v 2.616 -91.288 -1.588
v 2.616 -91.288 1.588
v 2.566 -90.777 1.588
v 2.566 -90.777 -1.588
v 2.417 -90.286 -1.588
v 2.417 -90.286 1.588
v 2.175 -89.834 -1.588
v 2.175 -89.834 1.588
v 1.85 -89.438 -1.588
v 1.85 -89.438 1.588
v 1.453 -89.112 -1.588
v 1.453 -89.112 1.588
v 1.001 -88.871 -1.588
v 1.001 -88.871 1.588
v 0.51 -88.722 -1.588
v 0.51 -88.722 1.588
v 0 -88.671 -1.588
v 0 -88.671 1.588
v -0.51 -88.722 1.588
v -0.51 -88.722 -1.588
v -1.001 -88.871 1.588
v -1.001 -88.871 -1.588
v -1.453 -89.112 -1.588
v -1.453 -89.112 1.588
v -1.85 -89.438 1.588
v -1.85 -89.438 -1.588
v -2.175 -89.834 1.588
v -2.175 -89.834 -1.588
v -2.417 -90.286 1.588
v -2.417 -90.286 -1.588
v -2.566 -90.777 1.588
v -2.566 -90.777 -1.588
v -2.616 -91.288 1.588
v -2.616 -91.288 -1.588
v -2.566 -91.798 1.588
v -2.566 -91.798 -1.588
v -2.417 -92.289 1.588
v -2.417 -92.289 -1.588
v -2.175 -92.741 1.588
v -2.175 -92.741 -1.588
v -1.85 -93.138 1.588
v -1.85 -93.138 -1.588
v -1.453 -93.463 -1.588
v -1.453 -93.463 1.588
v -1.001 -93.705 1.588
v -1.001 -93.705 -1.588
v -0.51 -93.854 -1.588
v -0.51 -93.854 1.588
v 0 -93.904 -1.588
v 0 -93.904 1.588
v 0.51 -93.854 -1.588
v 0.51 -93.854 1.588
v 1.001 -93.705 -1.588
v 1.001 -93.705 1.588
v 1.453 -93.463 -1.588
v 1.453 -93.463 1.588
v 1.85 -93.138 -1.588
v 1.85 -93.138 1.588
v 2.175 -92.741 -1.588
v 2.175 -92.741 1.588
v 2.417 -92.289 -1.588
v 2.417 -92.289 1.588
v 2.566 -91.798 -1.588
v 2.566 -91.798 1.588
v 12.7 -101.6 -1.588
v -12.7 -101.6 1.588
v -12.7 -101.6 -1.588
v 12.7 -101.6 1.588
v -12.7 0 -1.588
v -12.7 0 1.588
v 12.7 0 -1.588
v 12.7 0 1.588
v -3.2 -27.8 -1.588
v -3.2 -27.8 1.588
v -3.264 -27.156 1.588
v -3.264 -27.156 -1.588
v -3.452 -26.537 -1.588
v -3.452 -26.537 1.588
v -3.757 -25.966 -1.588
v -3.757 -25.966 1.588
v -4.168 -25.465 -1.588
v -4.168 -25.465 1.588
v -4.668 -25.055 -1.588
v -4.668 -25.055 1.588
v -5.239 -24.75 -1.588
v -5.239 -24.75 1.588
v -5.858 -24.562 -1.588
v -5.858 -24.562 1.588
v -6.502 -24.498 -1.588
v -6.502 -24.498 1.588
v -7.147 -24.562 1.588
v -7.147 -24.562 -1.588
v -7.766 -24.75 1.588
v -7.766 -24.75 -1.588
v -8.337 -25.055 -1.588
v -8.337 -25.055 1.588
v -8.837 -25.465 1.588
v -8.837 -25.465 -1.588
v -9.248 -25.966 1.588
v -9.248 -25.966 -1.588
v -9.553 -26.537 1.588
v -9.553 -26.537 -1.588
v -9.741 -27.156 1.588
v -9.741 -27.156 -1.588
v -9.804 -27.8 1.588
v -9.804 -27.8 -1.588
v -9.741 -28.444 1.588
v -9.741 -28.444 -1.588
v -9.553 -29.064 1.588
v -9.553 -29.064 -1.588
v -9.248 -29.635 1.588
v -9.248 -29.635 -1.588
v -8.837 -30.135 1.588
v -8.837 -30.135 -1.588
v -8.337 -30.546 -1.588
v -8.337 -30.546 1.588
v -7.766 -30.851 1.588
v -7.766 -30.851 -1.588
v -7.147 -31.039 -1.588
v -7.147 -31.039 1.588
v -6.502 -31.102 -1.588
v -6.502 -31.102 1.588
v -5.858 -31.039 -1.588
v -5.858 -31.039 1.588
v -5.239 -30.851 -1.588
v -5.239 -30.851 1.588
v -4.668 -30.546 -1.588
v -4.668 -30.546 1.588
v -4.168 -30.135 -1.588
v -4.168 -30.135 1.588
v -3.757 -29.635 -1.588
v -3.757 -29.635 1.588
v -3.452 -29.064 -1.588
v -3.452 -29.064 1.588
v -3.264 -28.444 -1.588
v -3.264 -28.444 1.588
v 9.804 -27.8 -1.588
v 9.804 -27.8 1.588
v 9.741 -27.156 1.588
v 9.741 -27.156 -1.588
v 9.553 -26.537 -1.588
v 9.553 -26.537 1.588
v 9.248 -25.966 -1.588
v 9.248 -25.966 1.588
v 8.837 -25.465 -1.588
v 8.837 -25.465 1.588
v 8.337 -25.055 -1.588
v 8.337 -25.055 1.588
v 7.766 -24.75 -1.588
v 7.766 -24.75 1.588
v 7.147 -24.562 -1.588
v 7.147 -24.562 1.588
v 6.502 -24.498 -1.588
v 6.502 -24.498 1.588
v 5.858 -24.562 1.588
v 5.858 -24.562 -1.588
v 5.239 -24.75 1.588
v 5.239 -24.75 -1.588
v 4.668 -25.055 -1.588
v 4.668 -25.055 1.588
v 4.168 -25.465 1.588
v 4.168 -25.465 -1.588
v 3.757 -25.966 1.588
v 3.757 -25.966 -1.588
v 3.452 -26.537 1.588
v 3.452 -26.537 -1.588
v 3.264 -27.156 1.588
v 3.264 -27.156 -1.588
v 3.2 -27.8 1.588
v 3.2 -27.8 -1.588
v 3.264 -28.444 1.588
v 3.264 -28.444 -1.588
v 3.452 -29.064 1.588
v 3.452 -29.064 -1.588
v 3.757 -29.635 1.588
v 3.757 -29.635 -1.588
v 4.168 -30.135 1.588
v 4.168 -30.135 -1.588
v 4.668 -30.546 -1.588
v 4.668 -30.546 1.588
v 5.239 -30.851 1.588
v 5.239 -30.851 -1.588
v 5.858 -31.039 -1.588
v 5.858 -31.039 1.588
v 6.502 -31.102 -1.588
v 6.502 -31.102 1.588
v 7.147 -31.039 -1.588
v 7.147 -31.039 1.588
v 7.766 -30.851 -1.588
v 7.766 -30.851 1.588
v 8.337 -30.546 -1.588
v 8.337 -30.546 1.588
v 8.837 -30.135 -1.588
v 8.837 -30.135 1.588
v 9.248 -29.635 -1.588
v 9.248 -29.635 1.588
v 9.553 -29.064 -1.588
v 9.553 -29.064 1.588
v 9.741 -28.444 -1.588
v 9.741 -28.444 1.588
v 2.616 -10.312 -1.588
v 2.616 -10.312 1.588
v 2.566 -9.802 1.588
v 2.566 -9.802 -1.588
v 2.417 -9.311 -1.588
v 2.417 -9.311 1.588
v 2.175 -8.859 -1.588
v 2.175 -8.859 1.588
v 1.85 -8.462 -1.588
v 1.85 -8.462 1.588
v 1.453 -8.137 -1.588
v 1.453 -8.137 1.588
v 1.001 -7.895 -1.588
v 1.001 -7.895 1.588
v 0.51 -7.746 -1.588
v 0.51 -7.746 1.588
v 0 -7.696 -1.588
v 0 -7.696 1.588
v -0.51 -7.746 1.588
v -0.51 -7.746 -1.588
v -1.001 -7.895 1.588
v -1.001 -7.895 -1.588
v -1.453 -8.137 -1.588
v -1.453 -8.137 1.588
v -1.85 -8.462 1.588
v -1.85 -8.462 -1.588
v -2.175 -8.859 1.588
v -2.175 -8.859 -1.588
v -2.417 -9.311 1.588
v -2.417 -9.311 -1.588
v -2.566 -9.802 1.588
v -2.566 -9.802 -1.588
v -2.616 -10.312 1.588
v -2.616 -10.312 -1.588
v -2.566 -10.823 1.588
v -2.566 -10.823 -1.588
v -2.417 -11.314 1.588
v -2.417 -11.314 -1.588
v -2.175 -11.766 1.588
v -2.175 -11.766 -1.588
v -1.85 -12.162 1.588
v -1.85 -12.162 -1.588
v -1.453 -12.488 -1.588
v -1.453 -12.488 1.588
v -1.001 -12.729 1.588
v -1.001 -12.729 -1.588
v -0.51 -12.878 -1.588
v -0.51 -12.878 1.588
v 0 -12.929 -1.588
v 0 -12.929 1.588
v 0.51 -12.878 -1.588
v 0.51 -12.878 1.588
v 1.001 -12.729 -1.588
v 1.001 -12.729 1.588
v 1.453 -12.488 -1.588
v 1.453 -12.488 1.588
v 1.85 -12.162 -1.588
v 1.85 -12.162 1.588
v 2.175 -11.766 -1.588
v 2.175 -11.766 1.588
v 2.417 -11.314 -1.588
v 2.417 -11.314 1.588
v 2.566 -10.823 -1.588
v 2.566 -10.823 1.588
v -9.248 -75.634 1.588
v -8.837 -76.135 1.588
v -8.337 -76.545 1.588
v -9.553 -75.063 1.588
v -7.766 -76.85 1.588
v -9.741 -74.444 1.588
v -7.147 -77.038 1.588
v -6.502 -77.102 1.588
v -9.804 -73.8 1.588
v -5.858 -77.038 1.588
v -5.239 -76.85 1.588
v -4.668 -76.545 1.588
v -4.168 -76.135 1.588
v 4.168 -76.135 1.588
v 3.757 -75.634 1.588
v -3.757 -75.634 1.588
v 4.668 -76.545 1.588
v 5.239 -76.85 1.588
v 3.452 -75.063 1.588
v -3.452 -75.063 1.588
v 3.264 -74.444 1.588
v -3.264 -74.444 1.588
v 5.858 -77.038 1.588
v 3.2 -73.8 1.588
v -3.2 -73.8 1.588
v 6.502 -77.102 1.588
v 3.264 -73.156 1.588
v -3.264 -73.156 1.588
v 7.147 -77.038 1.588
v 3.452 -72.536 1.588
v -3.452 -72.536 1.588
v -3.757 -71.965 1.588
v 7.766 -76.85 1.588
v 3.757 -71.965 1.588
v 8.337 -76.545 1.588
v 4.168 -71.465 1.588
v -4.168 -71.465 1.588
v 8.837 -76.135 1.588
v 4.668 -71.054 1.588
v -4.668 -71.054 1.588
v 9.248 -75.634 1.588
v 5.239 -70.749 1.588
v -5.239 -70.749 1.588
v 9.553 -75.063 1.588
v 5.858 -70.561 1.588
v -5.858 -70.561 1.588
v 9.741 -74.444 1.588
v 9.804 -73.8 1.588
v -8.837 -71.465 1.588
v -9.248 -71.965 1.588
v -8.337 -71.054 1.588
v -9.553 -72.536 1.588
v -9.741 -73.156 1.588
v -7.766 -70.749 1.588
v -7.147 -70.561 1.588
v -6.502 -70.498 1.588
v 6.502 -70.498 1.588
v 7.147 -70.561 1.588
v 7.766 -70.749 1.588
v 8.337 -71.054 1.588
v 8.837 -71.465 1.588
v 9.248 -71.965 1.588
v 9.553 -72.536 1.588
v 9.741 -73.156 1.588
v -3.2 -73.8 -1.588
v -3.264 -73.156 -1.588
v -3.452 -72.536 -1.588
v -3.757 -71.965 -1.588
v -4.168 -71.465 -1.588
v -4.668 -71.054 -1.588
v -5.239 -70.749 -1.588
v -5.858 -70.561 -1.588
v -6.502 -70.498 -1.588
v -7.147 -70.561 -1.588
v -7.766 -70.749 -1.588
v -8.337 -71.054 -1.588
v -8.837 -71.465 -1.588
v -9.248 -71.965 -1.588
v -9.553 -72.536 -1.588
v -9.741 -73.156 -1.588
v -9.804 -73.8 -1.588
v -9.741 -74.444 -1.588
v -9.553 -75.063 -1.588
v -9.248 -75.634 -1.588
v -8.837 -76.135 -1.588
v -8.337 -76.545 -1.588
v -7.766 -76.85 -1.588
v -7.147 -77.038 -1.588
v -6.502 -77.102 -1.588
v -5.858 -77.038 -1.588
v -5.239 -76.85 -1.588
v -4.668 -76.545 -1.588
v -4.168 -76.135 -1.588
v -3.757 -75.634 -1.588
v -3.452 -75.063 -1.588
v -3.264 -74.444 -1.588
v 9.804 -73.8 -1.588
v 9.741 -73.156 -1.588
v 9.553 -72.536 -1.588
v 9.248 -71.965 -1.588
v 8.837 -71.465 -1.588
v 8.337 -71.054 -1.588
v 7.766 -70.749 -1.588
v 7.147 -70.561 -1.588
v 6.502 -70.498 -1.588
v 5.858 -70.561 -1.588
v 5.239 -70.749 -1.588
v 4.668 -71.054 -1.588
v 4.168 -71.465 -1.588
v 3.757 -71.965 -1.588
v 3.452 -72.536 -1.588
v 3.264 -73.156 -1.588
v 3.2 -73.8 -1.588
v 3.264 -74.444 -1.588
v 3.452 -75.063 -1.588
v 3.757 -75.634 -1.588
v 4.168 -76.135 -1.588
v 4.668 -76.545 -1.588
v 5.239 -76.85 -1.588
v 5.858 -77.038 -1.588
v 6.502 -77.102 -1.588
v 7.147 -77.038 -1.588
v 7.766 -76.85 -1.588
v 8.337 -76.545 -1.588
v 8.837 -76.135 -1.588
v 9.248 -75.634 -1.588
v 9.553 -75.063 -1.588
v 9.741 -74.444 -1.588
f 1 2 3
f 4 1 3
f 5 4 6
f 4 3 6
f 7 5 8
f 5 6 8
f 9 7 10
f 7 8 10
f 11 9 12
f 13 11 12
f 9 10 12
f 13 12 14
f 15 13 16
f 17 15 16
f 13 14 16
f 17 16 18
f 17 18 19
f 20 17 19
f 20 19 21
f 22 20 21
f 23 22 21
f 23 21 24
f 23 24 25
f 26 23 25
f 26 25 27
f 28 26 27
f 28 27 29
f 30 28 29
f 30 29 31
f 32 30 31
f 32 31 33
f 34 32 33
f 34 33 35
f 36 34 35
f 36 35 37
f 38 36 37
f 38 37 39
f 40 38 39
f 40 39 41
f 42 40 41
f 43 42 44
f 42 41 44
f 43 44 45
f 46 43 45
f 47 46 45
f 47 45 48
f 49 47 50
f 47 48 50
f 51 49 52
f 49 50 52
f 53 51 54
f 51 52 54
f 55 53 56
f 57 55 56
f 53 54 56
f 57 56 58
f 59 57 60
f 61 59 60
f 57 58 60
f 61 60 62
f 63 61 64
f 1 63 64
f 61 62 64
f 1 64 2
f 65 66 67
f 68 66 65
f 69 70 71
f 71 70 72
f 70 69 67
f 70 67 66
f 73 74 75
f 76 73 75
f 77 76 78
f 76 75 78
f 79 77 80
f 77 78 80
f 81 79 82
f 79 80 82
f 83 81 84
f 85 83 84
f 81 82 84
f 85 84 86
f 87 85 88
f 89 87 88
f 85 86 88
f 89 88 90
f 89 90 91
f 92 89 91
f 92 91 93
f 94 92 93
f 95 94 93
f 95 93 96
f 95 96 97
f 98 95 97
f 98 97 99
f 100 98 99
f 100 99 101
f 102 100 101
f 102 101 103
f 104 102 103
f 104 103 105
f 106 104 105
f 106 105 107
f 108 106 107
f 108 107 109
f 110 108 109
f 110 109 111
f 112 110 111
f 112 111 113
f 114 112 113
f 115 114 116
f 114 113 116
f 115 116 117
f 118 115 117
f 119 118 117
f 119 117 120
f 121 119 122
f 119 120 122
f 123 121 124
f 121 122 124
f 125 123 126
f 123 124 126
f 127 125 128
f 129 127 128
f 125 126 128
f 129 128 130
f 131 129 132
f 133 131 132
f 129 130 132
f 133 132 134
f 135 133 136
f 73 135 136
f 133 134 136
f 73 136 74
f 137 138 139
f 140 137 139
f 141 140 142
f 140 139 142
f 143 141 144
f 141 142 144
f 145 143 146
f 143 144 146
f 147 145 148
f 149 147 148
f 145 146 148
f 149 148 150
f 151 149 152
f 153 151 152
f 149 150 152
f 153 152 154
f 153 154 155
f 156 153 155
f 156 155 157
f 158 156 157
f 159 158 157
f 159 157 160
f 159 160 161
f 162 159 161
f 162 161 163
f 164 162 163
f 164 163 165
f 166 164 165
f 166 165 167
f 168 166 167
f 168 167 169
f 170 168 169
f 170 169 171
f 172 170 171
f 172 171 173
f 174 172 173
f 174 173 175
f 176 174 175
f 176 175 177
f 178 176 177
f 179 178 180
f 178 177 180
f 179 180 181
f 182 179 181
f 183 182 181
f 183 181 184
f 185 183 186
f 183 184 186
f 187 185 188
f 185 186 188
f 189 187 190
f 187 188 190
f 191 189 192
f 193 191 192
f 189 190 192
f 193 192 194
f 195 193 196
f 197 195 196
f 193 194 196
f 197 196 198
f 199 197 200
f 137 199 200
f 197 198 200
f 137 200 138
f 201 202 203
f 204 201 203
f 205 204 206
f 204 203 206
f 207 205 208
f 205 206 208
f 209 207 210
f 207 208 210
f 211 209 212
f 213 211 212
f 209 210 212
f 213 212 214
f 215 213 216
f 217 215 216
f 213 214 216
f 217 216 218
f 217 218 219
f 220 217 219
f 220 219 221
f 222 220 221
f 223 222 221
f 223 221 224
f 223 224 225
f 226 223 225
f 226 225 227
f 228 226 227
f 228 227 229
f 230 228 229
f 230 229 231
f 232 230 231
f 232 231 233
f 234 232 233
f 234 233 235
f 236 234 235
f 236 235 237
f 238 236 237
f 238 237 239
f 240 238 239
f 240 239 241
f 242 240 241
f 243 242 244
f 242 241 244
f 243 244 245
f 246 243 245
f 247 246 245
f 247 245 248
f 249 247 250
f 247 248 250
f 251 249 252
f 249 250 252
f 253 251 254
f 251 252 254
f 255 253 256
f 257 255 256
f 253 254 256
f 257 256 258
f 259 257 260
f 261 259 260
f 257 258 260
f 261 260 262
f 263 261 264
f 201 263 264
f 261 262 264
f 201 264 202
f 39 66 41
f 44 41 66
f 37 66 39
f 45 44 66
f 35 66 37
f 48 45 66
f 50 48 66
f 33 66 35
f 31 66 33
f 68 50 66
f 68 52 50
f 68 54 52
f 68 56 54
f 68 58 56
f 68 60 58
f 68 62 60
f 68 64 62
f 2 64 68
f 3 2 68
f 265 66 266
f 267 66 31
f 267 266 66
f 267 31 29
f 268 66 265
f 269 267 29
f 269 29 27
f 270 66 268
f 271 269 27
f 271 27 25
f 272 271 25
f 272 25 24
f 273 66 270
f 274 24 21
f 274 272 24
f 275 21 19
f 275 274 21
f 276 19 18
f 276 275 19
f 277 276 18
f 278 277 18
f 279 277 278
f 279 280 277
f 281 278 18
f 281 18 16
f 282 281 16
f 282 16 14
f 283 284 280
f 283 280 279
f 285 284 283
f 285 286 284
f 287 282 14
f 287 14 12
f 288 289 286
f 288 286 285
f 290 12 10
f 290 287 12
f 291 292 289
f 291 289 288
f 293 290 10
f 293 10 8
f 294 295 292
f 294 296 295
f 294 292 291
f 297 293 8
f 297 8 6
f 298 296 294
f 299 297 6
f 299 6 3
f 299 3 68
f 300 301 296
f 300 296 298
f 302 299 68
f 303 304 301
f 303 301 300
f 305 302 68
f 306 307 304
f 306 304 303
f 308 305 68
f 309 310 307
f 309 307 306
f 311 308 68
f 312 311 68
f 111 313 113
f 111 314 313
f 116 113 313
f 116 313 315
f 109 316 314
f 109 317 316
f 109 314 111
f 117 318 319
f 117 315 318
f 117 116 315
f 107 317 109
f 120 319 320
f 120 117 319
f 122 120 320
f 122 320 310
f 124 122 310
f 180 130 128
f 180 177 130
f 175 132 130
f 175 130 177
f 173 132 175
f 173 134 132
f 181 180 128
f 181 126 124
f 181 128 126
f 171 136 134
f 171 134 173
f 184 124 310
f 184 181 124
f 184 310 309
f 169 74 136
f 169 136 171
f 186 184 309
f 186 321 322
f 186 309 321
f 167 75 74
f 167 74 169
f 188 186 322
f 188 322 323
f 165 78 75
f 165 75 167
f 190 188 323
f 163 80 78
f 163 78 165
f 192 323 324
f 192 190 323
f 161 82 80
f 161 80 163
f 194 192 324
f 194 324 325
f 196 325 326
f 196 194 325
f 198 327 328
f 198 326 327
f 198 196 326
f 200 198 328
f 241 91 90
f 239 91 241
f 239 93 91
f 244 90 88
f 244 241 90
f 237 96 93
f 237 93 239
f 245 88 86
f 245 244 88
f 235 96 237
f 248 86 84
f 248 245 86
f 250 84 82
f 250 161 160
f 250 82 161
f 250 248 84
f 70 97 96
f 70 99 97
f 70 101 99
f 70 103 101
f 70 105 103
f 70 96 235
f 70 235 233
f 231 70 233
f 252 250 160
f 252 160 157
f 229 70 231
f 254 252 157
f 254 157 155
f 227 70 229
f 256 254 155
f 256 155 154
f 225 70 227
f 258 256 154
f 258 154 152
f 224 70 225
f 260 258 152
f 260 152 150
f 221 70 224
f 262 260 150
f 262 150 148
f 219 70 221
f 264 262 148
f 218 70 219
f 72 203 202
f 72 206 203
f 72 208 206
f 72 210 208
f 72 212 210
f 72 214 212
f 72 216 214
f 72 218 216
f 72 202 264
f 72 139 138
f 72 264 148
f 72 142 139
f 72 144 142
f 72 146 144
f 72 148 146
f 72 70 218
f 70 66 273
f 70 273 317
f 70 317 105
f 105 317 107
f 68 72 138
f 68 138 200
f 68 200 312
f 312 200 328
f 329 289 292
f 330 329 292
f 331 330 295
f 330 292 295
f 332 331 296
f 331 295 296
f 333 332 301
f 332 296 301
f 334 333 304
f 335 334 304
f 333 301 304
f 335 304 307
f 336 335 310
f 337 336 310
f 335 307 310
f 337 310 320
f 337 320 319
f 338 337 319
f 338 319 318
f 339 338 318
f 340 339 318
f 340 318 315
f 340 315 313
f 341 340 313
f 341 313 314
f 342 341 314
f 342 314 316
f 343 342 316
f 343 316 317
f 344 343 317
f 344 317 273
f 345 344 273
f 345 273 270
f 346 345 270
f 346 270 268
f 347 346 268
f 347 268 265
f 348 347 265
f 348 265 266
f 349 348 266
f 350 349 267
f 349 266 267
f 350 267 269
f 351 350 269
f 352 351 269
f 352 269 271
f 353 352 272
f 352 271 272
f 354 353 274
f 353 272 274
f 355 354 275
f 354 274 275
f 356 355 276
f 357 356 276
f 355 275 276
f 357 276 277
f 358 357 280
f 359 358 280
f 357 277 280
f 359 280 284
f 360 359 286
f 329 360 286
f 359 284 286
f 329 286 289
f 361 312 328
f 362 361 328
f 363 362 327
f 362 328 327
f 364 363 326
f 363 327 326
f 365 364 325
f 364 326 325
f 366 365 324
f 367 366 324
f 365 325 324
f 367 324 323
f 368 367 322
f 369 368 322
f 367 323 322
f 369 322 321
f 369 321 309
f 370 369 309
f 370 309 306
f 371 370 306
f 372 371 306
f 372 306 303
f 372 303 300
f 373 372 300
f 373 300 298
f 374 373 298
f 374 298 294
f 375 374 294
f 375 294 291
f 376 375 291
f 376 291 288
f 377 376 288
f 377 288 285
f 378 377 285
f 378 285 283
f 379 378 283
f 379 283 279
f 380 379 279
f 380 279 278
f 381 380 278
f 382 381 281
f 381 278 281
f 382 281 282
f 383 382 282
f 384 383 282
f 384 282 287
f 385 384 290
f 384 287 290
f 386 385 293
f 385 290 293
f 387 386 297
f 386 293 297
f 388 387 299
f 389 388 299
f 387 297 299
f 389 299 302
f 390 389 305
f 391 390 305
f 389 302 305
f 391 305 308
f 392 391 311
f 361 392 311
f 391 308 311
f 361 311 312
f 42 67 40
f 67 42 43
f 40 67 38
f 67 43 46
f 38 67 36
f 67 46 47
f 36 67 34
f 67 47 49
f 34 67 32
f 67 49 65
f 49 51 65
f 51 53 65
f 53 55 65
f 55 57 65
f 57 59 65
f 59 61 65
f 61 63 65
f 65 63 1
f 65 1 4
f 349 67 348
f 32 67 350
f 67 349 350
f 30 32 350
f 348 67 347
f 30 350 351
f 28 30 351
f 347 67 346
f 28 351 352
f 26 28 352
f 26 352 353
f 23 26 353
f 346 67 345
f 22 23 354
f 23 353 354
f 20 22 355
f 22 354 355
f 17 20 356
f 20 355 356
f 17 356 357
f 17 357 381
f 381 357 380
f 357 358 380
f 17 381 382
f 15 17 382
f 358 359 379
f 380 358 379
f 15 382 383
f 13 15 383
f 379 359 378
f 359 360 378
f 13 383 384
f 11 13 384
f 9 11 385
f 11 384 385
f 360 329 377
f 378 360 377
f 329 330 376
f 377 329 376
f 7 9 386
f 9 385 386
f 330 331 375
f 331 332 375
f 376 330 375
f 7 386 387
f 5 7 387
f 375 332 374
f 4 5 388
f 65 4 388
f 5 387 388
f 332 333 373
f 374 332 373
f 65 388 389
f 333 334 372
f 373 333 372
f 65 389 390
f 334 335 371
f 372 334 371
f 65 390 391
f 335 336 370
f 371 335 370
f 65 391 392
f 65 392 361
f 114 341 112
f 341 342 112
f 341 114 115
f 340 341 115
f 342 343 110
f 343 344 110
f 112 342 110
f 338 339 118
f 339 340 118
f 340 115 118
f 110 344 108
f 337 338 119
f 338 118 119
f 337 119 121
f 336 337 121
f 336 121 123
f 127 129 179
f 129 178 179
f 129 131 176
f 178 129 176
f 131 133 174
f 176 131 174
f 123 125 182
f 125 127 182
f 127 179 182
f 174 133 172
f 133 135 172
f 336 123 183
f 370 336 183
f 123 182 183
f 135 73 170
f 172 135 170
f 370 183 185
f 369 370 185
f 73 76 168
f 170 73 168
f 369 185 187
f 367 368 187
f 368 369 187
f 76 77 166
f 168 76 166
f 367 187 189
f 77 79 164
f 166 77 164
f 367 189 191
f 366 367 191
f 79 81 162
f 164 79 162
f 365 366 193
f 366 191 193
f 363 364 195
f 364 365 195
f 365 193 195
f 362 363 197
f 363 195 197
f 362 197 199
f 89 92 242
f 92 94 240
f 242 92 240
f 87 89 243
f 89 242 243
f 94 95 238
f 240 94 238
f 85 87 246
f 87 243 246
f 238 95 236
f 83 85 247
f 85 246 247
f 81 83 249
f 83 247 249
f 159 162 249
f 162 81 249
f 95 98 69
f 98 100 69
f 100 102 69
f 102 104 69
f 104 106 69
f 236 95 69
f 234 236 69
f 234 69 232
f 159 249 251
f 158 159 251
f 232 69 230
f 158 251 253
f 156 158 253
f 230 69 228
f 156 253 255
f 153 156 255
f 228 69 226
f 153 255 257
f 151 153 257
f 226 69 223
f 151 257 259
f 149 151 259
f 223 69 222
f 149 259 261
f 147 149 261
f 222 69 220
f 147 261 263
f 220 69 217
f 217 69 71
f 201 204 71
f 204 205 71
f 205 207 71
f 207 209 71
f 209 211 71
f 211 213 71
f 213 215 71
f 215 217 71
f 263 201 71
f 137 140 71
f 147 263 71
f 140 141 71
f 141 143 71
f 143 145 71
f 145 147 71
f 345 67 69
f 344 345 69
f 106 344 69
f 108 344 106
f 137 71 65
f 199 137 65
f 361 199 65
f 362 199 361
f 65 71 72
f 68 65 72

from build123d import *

# Parameters (mm, degrees)
F0_W     = 25.4
F0_H     = 3.175
F1_DEPTH = 101.6
F2_R     = 2.6162
F2_R_2   = 3.302
F3_DEPTH = 3.176


with BuildPart() as f1:
    # F0 (on Front) → F1 (new body)
    with BuildSketch(Plane.XZ):
        Rectangle(F0_W, F0_H)
    extrude(amount=F1_DEPTH)

    # F2 (on face) → F3 (cut, through all)
    with BuildSketch(Plane.XY.offset(1.5875)):
        with Locations((0, -91.2876)):
            Circle(F2_R)
        with Locations((0, -10.3124)):
            Circle(F2_R)
        with Locations((-6.5024, -27.8003)):
            Circle(F2_R_2)
        with Locations((6.5024, -27.8003)):
            Circle(F2_R_2)
        with Locations((6.5024, -73.7997)):
            Circle(F2_R_2)
        with Locations((-6.5024, -73.7997)):
            Circle(F2_R_2)
    extrude(amount=-F3_DEPTH, mode=Mode.SUBTRACT)


solid = f1.part
